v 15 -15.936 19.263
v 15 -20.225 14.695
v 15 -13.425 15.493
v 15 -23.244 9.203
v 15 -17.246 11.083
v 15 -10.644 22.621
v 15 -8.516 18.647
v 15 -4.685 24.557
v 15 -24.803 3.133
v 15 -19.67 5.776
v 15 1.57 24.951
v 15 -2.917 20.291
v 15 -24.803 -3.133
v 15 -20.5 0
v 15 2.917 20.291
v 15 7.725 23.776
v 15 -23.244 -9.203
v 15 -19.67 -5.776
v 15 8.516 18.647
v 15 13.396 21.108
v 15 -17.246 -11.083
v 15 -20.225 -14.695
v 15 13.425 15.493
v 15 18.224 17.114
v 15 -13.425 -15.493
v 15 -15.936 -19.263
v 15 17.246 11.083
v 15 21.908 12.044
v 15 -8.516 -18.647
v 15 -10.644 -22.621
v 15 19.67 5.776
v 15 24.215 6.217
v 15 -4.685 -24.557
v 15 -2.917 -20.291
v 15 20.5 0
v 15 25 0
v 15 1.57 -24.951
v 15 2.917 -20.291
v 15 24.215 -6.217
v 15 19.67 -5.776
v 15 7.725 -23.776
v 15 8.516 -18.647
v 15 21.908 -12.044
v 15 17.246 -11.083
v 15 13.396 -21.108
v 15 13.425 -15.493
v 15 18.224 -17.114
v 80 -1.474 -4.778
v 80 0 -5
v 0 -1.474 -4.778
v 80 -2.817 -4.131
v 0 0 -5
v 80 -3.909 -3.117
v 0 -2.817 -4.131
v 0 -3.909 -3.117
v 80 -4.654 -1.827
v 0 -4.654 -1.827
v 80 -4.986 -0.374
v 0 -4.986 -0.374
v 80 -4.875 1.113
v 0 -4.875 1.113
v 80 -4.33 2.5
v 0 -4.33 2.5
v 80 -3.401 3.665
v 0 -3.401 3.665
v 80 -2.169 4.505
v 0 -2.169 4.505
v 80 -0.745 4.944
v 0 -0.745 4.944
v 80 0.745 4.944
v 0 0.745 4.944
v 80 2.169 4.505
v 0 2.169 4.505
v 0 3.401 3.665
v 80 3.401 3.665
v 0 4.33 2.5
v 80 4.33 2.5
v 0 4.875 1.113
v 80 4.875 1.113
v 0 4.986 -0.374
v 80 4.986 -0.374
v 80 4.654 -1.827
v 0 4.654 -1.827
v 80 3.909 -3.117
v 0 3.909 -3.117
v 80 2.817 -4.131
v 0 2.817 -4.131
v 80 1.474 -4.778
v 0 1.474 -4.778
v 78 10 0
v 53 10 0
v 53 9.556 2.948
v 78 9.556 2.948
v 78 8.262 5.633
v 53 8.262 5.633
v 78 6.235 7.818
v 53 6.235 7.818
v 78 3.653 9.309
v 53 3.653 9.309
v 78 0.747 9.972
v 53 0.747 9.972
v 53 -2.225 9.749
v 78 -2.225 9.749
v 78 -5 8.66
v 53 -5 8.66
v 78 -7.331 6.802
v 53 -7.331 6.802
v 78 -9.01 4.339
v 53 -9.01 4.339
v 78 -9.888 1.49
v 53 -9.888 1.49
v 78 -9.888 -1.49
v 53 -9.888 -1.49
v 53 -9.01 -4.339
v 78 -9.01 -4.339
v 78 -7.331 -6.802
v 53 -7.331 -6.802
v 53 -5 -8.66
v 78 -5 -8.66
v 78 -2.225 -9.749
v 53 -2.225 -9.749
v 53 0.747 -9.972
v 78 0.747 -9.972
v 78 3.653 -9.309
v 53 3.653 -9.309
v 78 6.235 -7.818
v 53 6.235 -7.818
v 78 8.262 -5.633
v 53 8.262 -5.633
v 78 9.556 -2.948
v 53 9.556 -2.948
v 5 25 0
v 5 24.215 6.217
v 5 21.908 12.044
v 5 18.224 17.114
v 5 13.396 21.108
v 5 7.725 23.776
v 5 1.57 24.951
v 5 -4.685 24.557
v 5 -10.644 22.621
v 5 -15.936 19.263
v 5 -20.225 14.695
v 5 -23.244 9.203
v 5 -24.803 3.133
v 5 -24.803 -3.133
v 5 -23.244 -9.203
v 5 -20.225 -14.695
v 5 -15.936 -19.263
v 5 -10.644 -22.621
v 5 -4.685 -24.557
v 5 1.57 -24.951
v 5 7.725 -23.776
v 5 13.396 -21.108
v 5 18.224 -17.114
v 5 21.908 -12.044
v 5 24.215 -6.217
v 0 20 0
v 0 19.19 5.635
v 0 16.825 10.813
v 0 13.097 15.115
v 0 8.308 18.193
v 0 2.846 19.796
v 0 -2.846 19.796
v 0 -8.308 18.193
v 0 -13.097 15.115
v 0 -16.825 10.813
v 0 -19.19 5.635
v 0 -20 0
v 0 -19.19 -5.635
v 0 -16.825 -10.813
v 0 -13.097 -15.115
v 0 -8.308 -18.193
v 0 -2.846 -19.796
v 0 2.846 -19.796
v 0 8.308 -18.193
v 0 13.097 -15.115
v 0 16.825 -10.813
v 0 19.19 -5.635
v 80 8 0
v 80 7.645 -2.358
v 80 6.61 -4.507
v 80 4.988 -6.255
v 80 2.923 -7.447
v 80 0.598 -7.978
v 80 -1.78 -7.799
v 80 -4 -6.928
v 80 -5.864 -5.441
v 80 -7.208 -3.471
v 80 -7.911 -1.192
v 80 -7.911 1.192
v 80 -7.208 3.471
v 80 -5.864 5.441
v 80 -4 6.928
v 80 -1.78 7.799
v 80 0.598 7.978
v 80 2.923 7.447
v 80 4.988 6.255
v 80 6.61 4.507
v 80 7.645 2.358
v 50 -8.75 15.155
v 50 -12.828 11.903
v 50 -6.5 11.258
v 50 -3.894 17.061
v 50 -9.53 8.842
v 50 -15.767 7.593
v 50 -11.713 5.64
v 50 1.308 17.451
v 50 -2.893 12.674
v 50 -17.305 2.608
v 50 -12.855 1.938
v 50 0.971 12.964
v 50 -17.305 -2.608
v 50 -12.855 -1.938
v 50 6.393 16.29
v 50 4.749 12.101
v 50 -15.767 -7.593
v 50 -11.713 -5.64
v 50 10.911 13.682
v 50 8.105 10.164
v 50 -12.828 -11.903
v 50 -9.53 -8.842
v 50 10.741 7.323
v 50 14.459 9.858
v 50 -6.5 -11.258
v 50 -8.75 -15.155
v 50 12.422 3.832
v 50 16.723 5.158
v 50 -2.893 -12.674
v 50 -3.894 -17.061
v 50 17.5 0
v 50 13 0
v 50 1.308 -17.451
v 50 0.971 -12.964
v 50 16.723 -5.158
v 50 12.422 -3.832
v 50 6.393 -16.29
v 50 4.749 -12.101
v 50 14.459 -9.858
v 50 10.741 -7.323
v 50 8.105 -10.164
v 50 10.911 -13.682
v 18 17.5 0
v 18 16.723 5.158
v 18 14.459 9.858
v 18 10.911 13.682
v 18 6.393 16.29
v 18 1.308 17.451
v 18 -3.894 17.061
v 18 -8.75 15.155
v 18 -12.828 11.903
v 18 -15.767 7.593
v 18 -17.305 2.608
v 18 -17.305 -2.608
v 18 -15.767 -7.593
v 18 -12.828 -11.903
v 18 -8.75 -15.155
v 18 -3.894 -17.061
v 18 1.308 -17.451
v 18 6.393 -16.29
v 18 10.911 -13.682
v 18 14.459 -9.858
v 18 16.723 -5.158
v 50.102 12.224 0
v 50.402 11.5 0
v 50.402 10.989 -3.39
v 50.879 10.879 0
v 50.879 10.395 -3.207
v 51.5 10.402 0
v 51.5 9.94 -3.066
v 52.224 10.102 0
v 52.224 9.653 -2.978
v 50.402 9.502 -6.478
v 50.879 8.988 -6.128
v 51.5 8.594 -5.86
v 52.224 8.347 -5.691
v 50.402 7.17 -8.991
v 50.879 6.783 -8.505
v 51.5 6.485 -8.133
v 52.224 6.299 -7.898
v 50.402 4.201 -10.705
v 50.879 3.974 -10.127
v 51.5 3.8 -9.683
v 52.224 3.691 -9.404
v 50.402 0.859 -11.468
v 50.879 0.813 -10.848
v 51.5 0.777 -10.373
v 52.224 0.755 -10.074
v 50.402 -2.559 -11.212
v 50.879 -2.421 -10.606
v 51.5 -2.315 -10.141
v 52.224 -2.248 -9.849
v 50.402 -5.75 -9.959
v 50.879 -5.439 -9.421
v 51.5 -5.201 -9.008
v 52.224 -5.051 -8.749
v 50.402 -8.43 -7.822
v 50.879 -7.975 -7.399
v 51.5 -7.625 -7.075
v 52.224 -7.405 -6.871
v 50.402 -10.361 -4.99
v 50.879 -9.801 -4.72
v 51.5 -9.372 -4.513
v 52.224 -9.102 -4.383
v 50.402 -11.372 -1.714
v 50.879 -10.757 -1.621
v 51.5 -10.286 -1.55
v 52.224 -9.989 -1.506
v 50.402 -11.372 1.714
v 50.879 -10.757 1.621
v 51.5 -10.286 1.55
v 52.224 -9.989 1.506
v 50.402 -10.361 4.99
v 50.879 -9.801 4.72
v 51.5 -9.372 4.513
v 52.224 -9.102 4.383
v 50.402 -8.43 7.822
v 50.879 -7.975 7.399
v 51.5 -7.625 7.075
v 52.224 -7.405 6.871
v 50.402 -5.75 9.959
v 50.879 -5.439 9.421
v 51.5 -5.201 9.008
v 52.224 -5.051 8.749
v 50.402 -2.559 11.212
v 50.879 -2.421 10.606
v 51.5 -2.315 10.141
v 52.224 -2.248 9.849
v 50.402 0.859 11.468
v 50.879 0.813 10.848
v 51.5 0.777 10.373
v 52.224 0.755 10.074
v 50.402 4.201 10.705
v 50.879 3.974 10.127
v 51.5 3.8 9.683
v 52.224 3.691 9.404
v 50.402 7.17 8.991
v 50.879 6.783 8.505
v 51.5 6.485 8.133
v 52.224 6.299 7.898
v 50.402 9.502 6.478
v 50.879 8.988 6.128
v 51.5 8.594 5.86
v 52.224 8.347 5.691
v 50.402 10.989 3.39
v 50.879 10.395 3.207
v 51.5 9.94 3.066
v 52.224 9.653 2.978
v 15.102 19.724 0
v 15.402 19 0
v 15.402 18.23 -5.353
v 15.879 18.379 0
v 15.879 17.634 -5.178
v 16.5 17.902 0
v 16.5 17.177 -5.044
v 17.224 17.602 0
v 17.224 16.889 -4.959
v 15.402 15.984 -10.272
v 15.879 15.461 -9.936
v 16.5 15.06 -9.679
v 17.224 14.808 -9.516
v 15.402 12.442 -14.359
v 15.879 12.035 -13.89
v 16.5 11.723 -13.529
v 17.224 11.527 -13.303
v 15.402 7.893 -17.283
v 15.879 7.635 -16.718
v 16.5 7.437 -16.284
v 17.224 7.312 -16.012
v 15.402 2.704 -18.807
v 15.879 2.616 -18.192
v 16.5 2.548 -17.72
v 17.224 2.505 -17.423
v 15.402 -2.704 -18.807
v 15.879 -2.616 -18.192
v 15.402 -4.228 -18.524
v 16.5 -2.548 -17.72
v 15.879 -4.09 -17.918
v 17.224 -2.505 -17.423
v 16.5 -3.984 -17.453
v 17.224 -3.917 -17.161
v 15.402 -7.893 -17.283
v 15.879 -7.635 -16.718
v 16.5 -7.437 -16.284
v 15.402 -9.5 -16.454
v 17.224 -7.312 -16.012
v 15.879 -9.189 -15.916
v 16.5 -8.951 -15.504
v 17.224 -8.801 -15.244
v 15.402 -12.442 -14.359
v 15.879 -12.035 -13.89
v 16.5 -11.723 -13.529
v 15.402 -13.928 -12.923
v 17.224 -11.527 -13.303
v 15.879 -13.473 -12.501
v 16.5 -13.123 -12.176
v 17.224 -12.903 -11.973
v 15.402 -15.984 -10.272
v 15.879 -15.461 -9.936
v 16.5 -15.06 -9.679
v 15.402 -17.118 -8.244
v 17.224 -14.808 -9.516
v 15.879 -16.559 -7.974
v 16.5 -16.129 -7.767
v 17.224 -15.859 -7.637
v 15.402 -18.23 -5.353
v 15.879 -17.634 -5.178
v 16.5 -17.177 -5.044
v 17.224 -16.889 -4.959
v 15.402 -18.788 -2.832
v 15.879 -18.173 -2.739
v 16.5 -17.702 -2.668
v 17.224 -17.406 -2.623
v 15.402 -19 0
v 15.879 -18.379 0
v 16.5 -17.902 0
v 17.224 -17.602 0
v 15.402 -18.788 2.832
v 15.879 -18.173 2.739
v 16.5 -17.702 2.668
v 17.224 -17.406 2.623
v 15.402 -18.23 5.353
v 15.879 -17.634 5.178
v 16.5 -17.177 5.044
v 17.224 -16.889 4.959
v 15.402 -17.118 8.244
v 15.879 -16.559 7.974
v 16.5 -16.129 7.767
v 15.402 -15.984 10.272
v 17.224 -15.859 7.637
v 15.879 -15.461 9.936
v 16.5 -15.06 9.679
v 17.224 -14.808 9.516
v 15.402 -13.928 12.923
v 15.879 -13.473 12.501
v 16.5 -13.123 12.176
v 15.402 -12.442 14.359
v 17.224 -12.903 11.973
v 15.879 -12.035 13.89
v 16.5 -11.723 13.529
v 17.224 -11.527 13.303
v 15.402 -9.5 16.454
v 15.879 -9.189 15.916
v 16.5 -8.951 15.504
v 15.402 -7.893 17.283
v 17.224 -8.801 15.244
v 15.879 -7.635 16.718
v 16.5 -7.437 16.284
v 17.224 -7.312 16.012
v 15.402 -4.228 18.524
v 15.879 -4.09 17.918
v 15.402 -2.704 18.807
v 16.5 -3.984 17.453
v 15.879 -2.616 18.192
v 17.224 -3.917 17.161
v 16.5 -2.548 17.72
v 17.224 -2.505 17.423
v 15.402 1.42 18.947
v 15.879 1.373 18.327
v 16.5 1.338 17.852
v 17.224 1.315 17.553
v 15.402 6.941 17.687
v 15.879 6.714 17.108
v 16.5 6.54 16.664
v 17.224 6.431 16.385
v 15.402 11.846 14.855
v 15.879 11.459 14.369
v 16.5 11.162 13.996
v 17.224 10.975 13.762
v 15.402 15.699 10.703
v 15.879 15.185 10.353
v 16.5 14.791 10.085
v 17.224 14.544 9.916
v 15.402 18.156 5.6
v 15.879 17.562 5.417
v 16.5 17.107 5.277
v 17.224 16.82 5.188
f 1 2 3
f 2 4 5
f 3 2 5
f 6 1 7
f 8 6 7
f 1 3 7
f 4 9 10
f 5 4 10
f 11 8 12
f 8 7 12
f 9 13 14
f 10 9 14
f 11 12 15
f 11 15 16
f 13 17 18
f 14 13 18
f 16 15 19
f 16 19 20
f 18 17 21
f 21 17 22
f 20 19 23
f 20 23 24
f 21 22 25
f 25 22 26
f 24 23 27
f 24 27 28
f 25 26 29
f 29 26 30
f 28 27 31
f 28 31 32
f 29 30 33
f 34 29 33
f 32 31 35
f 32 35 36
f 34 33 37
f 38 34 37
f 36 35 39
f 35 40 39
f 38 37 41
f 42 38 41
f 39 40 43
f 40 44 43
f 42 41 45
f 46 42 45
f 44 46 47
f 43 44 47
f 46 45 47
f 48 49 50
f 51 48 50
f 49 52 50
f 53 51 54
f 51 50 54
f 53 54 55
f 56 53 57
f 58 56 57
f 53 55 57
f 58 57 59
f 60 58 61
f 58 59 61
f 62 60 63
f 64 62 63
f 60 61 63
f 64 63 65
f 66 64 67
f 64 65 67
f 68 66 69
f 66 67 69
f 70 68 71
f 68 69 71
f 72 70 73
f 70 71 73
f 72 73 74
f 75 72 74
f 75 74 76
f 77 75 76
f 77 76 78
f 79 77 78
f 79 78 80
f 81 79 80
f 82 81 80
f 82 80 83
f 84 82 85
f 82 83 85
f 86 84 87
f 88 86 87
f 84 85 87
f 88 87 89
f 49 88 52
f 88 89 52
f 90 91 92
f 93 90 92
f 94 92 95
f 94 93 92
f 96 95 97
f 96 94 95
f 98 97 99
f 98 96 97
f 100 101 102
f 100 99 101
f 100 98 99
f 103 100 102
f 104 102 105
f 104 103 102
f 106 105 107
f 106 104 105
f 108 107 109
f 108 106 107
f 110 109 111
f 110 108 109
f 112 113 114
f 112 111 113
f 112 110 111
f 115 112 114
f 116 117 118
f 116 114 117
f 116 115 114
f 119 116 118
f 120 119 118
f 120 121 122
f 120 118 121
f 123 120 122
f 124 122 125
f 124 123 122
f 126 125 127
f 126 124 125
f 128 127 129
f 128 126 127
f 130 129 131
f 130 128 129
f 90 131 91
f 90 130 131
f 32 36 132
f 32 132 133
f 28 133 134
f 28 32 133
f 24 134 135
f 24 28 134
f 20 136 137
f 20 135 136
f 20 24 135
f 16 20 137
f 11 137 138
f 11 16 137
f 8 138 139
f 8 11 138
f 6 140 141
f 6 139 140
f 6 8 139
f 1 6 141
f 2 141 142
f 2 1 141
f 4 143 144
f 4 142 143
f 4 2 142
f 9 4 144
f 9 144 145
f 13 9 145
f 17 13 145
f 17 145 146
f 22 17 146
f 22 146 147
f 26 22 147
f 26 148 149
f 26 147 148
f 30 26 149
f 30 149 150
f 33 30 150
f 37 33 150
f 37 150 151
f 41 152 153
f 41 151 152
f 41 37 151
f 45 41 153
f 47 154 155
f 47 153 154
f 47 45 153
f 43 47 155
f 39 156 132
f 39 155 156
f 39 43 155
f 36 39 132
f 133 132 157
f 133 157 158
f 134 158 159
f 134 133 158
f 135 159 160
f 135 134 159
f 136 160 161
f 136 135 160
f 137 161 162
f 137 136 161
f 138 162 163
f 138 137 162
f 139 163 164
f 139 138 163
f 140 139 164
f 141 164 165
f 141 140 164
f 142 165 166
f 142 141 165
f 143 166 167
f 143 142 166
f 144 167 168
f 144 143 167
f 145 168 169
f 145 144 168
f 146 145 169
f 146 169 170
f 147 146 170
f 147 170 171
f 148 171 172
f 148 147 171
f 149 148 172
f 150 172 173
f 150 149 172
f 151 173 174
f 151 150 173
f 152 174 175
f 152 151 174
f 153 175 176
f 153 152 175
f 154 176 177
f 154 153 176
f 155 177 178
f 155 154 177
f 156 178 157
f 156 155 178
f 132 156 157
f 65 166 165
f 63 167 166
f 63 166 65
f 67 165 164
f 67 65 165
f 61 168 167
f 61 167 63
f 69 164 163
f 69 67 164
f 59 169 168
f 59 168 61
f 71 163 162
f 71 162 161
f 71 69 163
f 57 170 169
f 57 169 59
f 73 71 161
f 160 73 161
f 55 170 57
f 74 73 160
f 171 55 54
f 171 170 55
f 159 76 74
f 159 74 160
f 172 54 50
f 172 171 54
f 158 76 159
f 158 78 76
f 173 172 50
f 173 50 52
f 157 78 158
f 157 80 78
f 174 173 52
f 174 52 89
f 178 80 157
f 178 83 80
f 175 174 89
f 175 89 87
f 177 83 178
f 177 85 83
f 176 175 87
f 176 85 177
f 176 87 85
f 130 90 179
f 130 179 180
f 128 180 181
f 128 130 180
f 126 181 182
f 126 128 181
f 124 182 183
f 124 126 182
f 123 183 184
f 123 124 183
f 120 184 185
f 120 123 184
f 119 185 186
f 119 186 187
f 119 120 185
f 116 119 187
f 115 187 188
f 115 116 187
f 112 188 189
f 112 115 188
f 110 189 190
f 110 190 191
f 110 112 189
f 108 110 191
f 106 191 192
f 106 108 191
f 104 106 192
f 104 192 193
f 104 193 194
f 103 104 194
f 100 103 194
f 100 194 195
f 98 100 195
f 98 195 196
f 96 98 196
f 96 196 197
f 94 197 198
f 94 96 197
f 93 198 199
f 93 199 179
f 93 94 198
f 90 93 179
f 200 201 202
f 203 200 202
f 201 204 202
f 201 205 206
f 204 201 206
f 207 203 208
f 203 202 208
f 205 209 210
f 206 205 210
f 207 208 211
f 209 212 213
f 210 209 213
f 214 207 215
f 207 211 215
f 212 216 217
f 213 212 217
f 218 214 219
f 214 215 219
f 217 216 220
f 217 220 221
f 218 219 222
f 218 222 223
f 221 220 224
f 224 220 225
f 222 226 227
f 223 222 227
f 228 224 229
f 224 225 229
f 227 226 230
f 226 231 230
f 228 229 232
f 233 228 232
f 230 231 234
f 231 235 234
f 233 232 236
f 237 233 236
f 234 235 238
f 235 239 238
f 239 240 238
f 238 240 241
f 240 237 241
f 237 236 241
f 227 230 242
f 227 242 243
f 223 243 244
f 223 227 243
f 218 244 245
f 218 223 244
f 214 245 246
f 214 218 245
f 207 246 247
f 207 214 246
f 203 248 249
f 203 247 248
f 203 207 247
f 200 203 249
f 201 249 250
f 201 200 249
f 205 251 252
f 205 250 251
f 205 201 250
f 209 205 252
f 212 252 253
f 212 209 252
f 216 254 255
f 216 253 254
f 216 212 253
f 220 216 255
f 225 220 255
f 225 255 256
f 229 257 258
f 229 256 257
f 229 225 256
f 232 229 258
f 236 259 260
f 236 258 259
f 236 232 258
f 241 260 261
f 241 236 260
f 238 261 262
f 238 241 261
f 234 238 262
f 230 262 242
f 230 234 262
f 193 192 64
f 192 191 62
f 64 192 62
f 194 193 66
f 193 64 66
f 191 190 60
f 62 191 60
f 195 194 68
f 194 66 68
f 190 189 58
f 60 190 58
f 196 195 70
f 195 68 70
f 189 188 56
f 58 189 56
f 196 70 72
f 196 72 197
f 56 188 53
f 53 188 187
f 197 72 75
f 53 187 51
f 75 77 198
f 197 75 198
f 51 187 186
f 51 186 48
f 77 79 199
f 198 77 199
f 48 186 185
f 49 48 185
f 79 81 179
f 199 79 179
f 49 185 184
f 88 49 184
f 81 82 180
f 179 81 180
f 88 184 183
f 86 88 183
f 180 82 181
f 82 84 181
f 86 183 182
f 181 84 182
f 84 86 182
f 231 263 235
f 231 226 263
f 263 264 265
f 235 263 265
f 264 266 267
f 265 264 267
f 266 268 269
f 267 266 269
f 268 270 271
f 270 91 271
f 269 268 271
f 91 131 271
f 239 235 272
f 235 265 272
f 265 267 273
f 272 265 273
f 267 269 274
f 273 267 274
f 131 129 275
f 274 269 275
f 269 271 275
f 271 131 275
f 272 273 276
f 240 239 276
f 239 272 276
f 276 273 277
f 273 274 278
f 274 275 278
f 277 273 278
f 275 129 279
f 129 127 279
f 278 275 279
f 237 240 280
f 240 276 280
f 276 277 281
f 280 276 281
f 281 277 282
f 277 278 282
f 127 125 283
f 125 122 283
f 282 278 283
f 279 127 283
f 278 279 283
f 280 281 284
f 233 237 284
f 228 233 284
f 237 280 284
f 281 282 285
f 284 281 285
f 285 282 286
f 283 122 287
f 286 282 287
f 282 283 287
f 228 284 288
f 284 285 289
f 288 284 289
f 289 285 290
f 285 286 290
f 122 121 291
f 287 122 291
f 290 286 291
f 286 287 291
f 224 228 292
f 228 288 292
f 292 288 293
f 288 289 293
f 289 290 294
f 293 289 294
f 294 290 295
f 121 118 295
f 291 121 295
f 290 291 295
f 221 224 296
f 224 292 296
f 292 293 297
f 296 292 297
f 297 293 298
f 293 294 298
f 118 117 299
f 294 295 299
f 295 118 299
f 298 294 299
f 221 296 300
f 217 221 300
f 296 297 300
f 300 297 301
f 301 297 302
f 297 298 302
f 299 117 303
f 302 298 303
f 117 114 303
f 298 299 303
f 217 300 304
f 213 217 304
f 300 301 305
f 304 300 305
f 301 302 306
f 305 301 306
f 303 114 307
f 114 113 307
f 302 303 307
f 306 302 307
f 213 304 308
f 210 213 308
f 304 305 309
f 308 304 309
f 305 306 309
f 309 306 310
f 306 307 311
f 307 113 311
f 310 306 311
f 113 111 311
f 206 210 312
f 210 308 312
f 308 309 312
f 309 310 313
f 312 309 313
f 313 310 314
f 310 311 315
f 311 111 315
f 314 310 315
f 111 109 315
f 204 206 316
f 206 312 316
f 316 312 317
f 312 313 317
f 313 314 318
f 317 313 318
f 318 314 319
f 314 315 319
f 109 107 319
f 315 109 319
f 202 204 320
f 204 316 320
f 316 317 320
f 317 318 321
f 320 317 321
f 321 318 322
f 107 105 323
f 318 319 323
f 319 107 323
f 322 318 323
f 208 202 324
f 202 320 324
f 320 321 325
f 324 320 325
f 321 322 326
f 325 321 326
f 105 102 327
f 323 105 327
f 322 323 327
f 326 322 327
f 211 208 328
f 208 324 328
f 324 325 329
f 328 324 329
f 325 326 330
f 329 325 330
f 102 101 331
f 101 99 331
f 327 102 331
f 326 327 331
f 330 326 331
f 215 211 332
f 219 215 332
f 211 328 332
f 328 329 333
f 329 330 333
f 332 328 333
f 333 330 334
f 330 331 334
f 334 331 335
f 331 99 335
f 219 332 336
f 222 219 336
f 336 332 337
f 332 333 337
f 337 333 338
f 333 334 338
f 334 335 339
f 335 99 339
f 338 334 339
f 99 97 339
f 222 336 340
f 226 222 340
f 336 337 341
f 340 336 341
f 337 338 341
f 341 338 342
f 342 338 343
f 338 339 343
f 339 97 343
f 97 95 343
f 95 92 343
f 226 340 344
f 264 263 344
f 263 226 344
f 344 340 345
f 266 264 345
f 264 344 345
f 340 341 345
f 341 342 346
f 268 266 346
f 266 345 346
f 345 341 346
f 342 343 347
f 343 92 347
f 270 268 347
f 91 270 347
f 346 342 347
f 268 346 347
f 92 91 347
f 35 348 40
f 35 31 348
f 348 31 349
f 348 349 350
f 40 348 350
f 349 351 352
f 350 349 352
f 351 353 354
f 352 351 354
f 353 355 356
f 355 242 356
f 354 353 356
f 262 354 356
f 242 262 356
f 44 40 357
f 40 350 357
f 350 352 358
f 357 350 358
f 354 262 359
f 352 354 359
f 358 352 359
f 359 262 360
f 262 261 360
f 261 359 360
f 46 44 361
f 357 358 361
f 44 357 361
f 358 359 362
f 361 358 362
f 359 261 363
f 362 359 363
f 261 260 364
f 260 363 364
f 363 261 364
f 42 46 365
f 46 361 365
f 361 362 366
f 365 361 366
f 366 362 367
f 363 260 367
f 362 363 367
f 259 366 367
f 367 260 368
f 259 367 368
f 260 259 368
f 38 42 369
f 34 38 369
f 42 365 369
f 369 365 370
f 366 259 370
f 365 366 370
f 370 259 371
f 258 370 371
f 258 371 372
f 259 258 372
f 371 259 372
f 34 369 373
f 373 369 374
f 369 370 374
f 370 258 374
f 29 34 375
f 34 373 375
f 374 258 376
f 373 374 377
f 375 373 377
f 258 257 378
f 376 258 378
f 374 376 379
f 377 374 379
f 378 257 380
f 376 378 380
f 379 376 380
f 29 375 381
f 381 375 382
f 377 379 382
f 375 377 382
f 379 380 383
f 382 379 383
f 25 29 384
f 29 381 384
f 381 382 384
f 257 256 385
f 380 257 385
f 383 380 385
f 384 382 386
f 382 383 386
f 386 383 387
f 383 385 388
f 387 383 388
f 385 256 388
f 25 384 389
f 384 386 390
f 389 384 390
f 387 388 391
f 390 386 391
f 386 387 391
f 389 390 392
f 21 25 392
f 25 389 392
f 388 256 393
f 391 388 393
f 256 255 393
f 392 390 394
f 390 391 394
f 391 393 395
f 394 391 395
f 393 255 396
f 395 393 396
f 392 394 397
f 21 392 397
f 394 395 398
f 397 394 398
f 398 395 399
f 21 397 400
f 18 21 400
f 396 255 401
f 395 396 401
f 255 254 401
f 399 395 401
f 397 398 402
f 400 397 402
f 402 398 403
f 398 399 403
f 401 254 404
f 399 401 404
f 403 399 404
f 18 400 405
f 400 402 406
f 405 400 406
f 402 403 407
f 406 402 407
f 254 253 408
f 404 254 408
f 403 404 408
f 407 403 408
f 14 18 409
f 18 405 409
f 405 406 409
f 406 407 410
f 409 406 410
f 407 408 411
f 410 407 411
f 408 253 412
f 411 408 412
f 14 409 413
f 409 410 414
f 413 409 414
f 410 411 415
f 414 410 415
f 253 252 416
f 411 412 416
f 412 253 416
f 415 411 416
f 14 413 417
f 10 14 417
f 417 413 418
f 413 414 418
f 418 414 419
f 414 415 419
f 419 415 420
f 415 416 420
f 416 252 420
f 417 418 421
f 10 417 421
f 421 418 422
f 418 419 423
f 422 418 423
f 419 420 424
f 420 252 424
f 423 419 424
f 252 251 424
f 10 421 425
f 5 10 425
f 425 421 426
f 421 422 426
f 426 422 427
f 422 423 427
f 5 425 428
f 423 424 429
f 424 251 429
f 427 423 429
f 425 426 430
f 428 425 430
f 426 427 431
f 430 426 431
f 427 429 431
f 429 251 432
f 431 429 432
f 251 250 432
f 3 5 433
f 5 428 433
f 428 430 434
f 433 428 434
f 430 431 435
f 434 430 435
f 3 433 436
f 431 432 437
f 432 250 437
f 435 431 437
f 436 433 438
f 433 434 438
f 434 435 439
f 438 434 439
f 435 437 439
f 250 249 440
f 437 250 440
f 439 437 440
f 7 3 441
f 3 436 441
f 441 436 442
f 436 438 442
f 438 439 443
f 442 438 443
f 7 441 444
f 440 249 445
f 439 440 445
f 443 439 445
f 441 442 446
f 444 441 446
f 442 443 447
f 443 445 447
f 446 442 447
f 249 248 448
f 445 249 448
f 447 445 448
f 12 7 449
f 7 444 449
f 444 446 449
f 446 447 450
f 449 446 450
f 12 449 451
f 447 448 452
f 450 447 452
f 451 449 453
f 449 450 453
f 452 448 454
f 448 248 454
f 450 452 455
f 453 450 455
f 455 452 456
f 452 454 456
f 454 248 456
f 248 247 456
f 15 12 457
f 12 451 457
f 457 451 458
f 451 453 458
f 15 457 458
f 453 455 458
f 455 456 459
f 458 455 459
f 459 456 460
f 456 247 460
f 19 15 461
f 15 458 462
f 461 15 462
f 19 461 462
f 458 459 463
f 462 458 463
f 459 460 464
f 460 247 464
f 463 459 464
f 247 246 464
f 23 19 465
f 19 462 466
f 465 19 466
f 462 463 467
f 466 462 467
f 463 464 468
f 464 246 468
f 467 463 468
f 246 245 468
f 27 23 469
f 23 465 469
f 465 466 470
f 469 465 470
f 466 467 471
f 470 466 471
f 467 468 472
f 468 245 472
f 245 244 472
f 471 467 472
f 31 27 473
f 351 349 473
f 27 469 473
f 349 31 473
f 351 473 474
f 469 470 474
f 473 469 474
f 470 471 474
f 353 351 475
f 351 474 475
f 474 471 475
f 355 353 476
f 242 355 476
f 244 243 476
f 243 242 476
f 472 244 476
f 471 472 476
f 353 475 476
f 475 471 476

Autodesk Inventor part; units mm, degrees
ref_plane "YZ Plane" through (0, 0, 0) normal (1, 0, 0) x (0, 1, 0)
ref_plane "XZ Plane" through (0, 0, 0) normal (0, 1, 0) x (-1, 0, 0)
ref_plane "XY Plane" through (0, 0, 0) normal (0, 0, 1) x (1, 0, 0)
sketch "Esboço1" plane through (0, 0, 0) normal (0, 0, 1) x (1, 0, 0)
  line L0 (0, 0) -> (0, 25)
  line L1 (0, 25) -> (15, 25)
  line L2 (15, 25) -> (15, 17.5)
  line L3 (15, 17.5) -> (50, 17.5)
  line L4 (50, 17.5) -> (50, 10)
  line L5 (50, 10) -> (80, 10)
  line L6 (80, 10) -> (80, 0)
  line L7 (80, 0) -> (0, 0)
  dimension "d0" = 50
  dimension "d1" = 35
  dimension "d2" = 20
  dimension "d3" = 15
  dimension "d4" = 65
  dimension "d5" = 30
revolve "Revolução1" add sketch "Esboço1" angle 360 about axis through (80, 0, 0) along (-1, 0, 0)
fillet "Arredondamento1" radius 3 2 edges at (15, -17.5, 0) (50, -10, 0)
chamfer "Chanfro1" distance 2 angle 45 1 edges at (80, -10, 0)
chamfer "Chanfro2" distance 5 angle 45 1 edges at (0, -25, 0)
sketch "Esboço2" plane through (80, 0, 0) normal (1, 0, 0) x (0, 0, -1)
  circle A0 centre (0, 0) radius 10 projected
hole "Furo1" at (80, 0, 0) direction (-1, 0, 0) diameter 10 end through all
properties part number "3D Model"
